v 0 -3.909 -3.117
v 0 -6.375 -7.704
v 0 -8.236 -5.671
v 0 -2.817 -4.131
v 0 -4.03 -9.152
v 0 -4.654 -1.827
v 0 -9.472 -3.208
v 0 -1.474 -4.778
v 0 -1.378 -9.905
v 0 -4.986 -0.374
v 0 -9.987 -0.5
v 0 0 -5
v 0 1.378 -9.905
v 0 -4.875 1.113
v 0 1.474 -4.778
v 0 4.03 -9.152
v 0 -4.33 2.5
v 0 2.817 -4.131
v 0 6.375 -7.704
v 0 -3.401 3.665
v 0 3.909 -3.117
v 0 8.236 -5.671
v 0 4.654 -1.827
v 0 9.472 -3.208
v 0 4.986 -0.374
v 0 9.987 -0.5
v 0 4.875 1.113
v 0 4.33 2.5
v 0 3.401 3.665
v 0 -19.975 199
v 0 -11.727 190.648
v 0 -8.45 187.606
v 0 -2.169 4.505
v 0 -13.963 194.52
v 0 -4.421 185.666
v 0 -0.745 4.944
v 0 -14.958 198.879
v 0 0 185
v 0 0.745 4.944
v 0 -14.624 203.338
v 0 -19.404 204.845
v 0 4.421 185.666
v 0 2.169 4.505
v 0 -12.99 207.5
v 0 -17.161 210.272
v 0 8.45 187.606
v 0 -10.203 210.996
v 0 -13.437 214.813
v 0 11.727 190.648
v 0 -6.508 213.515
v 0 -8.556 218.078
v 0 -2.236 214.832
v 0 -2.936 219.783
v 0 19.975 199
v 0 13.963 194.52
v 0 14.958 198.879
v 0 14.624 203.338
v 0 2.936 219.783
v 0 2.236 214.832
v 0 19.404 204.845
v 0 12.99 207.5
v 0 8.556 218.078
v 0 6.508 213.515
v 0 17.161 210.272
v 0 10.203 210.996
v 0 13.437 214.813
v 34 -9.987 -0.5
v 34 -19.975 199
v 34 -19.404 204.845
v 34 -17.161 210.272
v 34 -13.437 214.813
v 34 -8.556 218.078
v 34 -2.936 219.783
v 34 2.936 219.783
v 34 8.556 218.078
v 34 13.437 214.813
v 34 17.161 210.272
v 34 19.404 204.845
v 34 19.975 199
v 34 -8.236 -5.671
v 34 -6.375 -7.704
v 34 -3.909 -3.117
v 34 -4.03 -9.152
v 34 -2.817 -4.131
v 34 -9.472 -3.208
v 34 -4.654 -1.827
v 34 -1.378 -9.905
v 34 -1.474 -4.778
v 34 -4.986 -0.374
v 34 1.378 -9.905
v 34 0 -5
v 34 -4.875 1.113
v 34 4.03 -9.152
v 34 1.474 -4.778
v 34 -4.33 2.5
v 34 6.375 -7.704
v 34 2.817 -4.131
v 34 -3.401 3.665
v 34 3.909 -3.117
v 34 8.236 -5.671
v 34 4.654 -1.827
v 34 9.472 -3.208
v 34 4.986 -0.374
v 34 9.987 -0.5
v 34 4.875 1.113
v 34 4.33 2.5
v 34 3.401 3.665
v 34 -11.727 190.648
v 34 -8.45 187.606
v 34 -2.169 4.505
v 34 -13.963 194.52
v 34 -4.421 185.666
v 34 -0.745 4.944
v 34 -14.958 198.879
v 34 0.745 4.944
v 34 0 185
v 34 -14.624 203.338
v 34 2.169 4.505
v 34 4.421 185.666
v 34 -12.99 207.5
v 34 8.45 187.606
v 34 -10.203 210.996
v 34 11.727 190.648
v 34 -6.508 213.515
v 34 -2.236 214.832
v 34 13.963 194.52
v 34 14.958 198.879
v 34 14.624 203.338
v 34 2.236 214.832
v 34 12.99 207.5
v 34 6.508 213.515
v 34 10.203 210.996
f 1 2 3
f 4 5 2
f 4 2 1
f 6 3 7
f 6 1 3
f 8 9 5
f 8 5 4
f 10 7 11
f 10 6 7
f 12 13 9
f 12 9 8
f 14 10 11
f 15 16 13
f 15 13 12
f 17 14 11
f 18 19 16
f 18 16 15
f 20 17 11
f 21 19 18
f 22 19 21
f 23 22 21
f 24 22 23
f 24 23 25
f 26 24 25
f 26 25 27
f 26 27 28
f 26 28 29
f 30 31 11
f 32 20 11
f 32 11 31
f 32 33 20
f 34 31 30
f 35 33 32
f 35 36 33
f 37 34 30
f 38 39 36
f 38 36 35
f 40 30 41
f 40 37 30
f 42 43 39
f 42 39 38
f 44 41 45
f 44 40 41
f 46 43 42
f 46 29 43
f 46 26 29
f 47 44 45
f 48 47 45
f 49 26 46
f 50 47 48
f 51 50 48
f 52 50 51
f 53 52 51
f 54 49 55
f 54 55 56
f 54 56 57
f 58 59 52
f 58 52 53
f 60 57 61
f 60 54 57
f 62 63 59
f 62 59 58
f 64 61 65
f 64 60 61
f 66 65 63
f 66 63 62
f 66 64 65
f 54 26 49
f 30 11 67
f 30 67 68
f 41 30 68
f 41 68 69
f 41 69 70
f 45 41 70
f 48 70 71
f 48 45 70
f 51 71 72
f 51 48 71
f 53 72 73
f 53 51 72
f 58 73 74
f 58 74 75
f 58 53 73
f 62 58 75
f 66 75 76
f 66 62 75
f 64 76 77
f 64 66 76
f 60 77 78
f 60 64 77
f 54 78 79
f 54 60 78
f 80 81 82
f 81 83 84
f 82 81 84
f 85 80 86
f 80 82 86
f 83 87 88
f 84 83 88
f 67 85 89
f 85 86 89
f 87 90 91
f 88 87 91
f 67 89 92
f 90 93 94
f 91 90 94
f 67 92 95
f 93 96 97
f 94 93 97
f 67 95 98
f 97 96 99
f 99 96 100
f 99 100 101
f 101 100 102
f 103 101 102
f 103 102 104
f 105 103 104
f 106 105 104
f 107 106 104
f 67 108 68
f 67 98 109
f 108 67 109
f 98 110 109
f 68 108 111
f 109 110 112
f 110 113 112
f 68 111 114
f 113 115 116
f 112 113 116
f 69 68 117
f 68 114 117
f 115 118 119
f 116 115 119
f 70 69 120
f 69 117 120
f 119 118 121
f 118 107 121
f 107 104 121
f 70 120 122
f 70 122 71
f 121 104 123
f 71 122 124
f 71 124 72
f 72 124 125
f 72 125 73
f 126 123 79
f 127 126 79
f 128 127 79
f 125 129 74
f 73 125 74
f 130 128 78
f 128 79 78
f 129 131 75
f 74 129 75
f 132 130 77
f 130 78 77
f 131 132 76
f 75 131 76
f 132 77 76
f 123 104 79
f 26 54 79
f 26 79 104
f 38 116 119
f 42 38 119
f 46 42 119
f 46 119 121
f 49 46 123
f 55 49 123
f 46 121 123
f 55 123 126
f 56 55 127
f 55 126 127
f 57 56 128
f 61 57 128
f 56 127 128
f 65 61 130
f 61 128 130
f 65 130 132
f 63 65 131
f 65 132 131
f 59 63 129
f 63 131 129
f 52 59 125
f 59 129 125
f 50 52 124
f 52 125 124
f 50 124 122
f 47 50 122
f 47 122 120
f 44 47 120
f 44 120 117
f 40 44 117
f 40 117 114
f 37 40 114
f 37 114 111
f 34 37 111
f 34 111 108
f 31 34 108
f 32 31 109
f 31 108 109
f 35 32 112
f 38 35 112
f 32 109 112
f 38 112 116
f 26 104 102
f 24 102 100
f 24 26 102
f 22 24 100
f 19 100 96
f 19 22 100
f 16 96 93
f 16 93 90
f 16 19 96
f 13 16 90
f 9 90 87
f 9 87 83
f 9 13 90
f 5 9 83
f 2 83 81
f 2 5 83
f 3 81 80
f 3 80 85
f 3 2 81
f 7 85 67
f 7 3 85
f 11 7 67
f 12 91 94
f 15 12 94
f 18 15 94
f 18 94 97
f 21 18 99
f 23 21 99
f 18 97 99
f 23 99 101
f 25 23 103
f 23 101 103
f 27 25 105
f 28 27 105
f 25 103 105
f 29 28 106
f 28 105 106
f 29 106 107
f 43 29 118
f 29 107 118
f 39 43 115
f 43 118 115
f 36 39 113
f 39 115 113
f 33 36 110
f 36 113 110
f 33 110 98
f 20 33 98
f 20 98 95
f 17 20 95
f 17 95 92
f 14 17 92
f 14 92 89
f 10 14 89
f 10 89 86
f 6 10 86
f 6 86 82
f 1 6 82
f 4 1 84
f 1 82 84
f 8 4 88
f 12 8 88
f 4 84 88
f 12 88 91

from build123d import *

# Parameters (mm, degrees)
PROFILE_EXTRUDE_DEPTH = 34
HOLES_SKETCH_R        = 5
HOLES_SKETCH_R_2      = 15
HOLES_CUT_DEPTH       = 34


with BuildPart() as part:
    # Profile Sketch → Profile Extrude (new body)
    with BuildSketch(Plane(origin=(0, 0, 0), x_dir=(0, 0, -1), z_dir=(1, 0, 0))):
        with BuildLine():
            Line((-199, 19.974984355), (0.5, 9.987492178))
            ThreePointArc((0.5, 9.987492178), (10, 0), (0.5, -9.987492178))
            Line((0.5, -9.987492178), (-199, -19.974984355))
            ThreePointArc((-199, -19.974984355), (-220, 0), (-199, 19.974984355))
        make_face()
    extrude(amount=PROFILE_EXTRUDE_DEPTH)

    # Holes Sketch → Holes Cut (cut)
    with BuildSketch(Plane(origin=(34, 0, 0), x_dir=(0, 0, -1), z_dir=(1, 0, 0))):
        Circle(HOLES_SKETCH_R)
        with Locations((-200, 0)):
            Circle(HOLES_SKETCH_R_2)
    extrude(amount=-HOLES_CUT_DEPTH, mode=Mode.SUBTRACT)


solid = part.part
